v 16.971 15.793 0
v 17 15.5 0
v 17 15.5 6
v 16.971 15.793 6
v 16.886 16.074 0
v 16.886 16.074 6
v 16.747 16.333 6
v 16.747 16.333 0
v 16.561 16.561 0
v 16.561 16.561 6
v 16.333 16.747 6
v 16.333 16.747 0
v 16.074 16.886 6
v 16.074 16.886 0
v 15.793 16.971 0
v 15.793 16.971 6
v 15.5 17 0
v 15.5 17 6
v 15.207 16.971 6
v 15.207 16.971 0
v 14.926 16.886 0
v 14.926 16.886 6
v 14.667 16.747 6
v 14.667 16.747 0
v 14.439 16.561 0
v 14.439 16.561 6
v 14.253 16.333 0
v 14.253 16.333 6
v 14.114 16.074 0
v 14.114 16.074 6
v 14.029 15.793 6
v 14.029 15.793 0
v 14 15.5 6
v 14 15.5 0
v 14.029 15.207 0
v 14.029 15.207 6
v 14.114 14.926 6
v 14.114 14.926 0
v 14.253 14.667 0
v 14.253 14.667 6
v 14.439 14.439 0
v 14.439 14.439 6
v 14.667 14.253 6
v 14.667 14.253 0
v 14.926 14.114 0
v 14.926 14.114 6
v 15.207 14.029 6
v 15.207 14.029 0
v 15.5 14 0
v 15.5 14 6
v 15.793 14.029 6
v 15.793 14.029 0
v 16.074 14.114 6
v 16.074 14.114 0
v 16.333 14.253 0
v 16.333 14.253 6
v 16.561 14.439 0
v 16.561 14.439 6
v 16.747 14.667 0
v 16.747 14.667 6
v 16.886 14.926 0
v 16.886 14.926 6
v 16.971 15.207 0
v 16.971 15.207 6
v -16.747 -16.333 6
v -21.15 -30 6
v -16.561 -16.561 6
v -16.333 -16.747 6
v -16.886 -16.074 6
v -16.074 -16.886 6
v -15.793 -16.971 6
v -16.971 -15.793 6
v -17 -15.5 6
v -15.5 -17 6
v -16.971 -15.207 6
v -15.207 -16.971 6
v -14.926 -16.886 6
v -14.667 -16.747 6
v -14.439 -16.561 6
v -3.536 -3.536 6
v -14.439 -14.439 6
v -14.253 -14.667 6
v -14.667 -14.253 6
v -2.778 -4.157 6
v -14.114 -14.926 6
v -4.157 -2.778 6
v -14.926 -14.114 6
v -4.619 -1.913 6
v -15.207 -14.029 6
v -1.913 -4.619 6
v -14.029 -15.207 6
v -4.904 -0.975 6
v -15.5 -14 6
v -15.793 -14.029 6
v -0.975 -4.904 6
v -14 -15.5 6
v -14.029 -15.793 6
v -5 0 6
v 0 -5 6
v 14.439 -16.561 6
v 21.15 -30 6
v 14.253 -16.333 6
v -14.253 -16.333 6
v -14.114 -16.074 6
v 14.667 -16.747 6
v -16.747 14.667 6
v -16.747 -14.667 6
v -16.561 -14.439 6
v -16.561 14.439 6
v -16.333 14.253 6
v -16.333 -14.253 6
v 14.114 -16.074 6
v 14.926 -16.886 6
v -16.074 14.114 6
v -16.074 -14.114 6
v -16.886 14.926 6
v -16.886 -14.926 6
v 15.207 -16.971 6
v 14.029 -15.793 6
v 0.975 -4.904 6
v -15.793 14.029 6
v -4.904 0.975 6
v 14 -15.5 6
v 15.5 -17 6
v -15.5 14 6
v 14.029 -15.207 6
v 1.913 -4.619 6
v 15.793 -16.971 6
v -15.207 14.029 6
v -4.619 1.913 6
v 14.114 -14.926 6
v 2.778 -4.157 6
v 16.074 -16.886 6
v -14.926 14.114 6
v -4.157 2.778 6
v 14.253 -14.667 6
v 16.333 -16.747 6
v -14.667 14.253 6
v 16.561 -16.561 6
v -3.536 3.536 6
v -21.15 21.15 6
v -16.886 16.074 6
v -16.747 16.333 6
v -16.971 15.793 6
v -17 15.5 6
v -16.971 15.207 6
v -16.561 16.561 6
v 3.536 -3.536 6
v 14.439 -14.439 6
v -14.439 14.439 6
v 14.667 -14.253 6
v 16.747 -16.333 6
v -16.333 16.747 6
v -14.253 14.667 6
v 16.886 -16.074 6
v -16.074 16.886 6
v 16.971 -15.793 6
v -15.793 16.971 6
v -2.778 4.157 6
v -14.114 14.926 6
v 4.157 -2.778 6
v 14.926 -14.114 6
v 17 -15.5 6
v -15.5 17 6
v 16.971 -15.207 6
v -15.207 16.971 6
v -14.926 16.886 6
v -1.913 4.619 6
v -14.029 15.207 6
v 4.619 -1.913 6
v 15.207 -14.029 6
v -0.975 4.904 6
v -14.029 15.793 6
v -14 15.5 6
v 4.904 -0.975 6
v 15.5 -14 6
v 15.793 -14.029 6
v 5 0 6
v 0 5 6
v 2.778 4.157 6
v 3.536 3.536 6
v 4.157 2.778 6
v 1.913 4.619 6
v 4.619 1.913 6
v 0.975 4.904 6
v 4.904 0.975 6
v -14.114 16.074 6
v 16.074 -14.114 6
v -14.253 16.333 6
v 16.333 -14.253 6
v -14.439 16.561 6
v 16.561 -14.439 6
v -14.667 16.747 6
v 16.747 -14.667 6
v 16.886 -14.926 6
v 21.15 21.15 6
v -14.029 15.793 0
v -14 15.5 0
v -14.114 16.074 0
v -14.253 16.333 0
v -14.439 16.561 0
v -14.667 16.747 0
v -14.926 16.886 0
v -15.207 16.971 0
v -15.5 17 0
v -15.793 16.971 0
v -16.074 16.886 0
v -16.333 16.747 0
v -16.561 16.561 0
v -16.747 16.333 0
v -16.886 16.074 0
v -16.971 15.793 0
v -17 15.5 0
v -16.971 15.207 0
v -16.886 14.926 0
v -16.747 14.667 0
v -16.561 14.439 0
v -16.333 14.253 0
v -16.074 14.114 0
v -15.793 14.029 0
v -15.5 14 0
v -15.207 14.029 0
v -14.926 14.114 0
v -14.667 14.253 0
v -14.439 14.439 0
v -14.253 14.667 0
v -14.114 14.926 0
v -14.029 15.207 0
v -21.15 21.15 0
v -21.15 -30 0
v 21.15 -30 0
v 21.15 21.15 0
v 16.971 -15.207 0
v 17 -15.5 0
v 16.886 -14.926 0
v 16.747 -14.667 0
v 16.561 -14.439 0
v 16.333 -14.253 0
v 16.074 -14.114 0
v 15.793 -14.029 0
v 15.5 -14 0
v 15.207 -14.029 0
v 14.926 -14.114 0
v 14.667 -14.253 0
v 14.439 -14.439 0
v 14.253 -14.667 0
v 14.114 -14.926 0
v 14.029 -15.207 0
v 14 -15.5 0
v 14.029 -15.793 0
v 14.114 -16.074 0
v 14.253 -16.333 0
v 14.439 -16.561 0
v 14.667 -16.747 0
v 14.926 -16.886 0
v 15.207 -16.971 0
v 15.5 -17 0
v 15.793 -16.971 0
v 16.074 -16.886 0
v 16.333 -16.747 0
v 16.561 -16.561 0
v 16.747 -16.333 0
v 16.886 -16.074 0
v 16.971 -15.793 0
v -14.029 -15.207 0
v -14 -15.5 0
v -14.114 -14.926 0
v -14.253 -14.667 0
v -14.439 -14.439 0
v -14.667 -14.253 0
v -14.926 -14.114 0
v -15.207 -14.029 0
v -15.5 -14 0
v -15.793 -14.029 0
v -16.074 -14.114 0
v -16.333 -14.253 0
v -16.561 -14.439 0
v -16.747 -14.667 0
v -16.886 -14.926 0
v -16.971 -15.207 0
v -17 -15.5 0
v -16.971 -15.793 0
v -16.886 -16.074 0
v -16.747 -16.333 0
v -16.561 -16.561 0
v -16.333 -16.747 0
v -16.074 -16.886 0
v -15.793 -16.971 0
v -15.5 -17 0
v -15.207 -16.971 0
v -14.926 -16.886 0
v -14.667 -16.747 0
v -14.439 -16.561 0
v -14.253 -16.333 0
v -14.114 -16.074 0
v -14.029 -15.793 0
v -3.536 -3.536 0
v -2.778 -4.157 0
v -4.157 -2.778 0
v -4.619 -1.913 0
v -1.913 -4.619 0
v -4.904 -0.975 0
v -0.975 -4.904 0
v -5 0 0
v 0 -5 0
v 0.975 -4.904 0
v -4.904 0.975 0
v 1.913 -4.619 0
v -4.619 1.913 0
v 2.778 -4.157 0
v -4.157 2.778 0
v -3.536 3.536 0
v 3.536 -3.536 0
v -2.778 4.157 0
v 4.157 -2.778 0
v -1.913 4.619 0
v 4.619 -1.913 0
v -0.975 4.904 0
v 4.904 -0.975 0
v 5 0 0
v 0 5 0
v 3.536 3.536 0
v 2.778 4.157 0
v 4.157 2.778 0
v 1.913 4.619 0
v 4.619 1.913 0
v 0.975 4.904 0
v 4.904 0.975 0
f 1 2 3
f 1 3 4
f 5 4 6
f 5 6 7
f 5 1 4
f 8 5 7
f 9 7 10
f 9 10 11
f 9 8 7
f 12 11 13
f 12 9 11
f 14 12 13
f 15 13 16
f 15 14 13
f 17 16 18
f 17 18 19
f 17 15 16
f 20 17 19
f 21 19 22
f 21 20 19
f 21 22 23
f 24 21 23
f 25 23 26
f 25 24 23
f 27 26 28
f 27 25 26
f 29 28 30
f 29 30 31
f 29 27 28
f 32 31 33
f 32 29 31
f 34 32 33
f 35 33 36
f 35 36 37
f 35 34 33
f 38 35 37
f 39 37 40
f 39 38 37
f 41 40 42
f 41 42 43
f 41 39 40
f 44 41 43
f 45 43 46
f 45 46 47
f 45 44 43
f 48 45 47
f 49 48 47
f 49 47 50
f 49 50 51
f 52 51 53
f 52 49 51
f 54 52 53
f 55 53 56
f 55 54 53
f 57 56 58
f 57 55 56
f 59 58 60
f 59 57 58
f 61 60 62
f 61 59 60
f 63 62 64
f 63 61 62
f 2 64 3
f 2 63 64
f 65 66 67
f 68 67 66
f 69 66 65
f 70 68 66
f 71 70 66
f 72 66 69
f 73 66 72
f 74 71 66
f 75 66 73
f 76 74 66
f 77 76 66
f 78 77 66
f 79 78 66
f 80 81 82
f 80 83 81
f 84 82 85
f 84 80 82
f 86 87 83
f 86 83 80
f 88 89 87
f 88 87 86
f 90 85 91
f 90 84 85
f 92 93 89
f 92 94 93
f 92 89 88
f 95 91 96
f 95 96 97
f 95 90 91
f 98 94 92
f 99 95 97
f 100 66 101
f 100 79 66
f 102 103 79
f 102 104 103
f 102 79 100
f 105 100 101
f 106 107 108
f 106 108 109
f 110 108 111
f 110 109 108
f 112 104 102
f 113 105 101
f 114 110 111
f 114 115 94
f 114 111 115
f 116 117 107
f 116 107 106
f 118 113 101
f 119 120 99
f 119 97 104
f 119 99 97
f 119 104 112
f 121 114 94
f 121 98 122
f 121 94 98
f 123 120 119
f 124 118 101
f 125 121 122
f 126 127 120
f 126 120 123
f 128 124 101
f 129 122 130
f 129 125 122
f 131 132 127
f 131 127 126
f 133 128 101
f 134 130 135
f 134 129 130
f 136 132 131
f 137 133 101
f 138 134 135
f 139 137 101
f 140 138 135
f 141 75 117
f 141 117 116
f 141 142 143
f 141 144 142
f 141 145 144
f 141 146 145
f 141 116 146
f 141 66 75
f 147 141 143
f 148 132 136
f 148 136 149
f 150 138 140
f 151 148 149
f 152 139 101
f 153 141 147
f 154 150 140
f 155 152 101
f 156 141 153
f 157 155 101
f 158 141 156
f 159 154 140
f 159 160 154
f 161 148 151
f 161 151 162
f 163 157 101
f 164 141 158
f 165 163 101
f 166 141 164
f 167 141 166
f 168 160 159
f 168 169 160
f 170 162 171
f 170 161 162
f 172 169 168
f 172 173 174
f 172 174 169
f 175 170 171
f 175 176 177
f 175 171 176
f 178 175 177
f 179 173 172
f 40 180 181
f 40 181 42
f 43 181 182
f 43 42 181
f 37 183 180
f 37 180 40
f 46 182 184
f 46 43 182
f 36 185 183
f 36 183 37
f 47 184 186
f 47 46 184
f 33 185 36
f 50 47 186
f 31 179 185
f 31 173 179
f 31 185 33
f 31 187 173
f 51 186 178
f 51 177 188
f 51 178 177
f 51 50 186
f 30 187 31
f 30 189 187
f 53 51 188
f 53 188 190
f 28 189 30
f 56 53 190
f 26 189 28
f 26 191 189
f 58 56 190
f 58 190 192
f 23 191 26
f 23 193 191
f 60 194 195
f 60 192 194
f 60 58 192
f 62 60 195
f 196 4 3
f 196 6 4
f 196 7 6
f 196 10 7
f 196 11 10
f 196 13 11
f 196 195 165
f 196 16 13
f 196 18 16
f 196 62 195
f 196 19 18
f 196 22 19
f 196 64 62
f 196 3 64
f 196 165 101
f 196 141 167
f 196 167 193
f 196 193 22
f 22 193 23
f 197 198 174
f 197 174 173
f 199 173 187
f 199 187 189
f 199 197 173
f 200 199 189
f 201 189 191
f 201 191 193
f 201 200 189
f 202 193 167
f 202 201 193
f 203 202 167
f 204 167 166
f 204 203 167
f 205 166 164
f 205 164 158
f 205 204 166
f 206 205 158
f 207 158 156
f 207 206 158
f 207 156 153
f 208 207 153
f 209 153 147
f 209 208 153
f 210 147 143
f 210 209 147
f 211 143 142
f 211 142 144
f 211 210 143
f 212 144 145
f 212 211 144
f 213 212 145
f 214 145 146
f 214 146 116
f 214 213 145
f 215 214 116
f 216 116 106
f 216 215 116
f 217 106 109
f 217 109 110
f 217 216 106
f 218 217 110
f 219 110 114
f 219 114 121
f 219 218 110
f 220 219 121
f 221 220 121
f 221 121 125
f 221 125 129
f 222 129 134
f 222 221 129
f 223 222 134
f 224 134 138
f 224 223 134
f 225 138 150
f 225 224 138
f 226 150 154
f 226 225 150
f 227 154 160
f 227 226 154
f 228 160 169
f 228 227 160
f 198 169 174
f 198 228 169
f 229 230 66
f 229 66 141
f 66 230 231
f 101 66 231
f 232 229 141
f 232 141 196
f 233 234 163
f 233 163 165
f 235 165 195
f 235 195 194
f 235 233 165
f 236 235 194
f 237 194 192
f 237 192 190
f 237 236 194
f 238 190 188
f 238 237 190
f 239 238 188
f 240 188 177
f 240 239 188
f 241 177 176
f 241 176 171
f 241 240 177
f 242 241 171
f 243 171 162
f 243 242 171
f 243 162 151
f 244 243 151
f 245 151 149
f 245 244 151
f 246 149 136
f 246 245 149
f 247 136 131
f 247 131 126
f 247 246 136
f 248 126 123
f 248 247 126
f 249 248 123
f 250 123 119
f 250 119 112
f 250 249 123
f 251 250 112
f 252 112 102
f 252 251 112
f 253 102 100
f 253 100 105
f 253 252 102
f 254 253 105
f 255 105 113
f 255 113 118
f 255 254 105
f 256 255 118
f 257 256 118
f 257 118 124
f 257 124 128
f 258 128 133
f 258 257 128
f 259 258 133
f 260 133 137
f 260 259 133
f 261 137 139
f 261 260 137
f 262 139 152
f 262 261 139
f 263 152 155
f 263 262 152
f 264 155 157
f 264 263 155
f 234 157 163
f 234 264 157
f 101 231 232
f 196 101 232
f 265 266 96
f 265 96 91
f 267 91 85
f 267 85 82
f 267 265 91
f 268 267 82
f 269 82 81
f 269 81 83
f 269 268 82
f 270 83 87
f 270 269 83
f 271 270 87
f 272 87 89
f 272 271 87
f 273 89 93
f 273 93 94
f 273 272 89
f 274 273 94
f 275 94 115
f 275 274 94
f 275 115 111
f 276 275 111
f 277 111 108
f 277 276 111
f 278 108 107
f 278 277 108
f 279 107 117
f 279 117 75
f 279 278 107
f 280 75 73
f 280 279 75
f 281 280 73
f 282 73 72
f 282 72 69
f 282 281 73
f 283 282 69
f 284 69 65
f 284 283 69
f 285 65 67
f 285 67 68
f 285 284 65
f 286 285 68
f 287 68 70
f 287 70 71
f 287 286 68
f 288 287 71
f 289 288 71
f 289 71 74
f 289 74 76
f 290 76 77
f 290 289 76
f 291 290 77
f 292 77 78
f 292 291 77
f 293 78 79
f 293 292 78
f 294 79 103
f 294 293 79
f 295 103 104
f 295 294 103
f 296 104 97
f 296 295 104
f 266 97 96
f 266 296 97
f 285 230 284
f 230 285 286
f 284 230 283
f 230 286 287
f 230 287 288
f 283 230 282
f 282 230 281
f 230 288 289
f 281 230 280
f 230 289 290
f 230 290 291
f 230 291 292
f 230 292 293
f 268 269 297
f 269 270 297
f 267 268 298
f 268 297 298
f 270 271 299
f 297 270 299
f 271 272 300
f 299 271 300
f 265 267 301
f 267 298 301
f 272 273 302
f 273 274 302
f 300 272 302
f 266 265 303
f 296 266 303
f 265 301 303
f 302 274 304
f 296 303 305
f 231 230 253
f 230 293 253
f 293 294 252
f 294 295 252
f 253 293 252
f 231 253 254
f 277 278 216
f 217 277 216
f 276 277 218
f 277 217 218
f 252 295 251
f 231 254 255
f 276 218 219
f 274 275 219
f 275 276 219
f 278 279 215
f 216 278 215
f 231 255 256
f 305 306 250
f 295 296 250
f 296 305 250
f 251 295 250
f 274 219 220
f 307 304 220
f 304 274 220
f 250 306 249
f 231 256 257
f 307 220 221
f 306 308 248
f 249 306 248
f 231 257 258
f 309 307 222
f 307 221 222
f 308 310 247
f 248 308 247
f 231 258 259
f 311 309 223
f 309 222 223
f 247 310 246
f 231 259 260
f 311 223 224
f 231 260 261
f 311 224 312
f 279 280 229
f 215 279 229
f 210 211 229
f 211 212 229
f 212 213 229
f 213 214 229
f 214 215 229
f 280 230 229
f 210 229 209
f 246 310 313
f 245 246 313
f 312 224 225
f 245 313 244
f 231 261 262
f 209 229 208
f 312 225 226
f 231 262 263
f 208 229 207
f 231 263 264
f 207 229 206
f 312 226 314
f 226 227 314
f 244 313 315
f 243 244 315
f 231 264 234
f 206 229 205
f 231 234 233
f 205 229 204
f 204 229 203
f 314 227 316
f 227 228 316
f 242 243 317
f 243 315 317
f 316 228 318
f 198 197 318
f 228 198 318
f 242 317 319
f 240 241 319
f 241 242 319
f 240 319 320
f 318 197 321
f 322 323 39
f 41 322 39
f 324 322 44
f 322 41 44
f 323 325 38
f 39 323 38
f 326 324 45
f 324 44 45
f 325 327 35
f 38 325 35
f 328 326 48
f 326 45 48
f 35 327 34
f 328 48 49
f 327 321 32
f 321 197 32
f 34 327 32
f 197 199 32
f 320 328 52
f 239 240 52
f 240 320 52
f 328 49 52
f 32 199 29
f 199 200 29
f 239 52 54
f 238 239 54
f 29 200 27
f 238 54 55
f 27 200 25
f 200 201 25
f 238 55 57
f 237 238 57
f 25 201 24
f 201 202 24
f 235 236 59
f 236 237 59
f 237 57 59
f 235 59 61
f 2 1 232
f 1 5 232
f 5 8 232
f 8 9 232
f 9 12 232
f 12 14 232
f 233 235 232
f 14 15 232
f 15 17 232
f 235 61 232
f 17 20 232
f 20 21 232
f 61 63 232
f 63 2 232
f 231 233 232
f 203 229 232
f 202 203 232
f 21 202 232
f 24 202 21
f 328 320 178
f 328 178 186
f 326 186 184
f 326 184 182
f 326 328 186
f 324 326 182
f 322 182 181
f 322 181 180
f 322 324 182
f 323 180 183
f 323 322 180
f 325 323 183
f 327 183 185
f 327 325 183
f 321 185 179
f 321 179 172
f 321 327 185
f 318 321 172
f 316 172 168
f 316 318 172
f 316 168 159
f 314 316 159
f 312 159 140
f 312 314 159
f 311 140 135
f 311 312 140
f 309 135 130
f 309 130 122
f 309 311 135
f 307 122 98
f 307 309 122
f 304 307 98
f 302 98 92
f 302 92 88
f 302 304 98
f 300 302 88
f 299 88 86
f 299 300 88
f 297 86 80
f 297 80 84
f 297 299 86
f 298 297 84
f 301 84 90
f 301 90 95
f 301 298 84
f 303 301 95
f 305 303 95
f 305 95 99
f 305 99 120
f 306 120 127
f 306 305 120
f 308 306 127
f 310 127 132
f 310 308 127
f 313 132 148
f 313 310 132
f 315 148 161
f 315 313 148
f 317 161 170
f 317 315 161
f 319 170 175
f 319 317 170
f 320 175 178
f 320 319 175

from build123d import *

# Parameters (mm, degrees)
F0_W     = 42.3
F0_H     = 51.15
F0_R     = 1.5
F0_R_2   = 5
F1_DEPTH = 6


with BuildPart() as f1:
    # F0 (on Top) → F1 (new body)
    with BuildSketch(Plane.XY):
        with Locations((0, -4.425)):
            Rectangle(F0_W, F0_H)
        with Locations((-15.5, -15.5)):
            Circle(F0_R, mode=Mode.SUBTRACT)
        with Locations((15.5, -15.5)):
            Circle(F0_R, mode=Mode.SUBTRACT)
        with Locations((-15.5, 15.5)):
            Circle(F0_R, mode=Mode.SUBTRACT)
        Circle(F0_R_2, mode=Mode.SUBTRACT)
        with Locations((15.5, 15.5)):
            Circle(F0_R, mode=Mode.SUBTRACT)
    extrude(amount=F1_DEPTH)


solid = f1.part
